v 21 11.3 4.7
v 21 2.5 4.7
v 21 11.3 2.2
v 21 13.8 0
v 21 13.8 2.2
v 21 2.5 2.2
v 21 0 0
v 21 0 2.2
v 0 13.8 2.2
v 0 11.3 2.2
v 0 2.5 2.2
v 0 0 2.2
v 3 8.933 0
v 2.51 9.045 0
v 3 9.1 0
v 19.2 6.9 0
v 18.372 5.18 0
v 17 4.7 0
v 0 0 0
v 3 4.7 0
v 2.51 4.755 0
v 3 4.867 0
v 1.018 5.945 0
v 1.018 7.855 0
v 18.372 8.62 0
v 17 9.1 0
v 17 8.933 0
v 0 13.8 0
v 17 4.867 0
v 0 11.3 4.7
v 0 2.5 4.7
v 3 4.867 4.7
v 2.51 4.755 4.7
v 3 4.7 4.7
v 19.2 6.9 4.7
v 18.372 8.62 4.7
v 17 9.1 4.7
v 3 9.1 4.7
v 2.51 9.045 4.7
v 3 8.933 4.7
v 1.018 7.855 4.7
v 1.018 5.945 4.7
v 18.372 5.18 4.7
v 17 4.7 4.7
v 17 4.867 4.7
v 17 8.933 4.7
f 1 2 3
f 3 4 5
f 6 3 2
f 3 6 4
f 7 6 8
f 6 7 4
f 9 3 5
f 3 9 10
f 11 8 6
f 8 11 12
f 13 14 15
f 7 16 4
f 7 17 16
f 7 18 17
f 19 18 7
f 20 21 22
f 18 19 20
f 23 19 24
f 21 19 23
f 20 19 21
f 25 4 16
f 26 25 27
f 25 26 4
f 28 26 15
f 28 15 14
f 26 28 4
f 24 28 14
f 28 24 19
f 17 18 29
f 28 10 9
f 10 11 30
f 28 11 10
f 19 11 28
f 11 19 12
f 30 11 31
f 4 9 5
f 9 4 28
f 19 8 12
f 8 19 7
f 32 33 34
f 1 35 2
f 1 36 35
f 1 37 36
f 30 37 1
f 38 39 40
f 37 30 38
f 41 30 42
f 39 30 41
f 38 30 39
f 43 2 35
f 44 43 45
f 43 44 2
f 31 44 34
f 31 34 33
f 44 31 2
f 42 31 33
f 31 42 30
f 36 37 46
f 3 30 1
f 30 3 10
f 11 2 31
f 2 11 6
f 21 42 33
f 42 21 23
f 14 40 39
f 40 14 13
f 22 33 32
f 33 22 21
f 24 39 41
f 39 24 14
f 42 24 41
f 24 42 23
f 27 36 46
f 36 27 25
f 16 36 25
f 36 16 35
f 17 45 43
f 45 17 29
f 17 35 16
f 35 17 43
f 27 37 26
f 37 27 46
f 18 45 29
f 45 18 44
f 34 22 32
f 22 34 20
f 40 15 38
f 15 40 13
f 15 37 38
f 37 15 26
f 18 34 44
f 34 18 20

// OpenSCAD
module Soporte(){
		cube([21,13.8,2.2]);
		translate([0, 2.5, 2.2])
			cube([21,8.8,2.5]);
}

difference (){

		Soporte();
		translate([3, 6.9, 0])
			cylinder(r=4.4/2, h=5, $f=100);
		translate([17, 6.9, 0])
			cylinder(r=4.4/2, h=5, $f=100);
		translate([3, 4.7, 0])
			cube([14,4.4,5]);
}
